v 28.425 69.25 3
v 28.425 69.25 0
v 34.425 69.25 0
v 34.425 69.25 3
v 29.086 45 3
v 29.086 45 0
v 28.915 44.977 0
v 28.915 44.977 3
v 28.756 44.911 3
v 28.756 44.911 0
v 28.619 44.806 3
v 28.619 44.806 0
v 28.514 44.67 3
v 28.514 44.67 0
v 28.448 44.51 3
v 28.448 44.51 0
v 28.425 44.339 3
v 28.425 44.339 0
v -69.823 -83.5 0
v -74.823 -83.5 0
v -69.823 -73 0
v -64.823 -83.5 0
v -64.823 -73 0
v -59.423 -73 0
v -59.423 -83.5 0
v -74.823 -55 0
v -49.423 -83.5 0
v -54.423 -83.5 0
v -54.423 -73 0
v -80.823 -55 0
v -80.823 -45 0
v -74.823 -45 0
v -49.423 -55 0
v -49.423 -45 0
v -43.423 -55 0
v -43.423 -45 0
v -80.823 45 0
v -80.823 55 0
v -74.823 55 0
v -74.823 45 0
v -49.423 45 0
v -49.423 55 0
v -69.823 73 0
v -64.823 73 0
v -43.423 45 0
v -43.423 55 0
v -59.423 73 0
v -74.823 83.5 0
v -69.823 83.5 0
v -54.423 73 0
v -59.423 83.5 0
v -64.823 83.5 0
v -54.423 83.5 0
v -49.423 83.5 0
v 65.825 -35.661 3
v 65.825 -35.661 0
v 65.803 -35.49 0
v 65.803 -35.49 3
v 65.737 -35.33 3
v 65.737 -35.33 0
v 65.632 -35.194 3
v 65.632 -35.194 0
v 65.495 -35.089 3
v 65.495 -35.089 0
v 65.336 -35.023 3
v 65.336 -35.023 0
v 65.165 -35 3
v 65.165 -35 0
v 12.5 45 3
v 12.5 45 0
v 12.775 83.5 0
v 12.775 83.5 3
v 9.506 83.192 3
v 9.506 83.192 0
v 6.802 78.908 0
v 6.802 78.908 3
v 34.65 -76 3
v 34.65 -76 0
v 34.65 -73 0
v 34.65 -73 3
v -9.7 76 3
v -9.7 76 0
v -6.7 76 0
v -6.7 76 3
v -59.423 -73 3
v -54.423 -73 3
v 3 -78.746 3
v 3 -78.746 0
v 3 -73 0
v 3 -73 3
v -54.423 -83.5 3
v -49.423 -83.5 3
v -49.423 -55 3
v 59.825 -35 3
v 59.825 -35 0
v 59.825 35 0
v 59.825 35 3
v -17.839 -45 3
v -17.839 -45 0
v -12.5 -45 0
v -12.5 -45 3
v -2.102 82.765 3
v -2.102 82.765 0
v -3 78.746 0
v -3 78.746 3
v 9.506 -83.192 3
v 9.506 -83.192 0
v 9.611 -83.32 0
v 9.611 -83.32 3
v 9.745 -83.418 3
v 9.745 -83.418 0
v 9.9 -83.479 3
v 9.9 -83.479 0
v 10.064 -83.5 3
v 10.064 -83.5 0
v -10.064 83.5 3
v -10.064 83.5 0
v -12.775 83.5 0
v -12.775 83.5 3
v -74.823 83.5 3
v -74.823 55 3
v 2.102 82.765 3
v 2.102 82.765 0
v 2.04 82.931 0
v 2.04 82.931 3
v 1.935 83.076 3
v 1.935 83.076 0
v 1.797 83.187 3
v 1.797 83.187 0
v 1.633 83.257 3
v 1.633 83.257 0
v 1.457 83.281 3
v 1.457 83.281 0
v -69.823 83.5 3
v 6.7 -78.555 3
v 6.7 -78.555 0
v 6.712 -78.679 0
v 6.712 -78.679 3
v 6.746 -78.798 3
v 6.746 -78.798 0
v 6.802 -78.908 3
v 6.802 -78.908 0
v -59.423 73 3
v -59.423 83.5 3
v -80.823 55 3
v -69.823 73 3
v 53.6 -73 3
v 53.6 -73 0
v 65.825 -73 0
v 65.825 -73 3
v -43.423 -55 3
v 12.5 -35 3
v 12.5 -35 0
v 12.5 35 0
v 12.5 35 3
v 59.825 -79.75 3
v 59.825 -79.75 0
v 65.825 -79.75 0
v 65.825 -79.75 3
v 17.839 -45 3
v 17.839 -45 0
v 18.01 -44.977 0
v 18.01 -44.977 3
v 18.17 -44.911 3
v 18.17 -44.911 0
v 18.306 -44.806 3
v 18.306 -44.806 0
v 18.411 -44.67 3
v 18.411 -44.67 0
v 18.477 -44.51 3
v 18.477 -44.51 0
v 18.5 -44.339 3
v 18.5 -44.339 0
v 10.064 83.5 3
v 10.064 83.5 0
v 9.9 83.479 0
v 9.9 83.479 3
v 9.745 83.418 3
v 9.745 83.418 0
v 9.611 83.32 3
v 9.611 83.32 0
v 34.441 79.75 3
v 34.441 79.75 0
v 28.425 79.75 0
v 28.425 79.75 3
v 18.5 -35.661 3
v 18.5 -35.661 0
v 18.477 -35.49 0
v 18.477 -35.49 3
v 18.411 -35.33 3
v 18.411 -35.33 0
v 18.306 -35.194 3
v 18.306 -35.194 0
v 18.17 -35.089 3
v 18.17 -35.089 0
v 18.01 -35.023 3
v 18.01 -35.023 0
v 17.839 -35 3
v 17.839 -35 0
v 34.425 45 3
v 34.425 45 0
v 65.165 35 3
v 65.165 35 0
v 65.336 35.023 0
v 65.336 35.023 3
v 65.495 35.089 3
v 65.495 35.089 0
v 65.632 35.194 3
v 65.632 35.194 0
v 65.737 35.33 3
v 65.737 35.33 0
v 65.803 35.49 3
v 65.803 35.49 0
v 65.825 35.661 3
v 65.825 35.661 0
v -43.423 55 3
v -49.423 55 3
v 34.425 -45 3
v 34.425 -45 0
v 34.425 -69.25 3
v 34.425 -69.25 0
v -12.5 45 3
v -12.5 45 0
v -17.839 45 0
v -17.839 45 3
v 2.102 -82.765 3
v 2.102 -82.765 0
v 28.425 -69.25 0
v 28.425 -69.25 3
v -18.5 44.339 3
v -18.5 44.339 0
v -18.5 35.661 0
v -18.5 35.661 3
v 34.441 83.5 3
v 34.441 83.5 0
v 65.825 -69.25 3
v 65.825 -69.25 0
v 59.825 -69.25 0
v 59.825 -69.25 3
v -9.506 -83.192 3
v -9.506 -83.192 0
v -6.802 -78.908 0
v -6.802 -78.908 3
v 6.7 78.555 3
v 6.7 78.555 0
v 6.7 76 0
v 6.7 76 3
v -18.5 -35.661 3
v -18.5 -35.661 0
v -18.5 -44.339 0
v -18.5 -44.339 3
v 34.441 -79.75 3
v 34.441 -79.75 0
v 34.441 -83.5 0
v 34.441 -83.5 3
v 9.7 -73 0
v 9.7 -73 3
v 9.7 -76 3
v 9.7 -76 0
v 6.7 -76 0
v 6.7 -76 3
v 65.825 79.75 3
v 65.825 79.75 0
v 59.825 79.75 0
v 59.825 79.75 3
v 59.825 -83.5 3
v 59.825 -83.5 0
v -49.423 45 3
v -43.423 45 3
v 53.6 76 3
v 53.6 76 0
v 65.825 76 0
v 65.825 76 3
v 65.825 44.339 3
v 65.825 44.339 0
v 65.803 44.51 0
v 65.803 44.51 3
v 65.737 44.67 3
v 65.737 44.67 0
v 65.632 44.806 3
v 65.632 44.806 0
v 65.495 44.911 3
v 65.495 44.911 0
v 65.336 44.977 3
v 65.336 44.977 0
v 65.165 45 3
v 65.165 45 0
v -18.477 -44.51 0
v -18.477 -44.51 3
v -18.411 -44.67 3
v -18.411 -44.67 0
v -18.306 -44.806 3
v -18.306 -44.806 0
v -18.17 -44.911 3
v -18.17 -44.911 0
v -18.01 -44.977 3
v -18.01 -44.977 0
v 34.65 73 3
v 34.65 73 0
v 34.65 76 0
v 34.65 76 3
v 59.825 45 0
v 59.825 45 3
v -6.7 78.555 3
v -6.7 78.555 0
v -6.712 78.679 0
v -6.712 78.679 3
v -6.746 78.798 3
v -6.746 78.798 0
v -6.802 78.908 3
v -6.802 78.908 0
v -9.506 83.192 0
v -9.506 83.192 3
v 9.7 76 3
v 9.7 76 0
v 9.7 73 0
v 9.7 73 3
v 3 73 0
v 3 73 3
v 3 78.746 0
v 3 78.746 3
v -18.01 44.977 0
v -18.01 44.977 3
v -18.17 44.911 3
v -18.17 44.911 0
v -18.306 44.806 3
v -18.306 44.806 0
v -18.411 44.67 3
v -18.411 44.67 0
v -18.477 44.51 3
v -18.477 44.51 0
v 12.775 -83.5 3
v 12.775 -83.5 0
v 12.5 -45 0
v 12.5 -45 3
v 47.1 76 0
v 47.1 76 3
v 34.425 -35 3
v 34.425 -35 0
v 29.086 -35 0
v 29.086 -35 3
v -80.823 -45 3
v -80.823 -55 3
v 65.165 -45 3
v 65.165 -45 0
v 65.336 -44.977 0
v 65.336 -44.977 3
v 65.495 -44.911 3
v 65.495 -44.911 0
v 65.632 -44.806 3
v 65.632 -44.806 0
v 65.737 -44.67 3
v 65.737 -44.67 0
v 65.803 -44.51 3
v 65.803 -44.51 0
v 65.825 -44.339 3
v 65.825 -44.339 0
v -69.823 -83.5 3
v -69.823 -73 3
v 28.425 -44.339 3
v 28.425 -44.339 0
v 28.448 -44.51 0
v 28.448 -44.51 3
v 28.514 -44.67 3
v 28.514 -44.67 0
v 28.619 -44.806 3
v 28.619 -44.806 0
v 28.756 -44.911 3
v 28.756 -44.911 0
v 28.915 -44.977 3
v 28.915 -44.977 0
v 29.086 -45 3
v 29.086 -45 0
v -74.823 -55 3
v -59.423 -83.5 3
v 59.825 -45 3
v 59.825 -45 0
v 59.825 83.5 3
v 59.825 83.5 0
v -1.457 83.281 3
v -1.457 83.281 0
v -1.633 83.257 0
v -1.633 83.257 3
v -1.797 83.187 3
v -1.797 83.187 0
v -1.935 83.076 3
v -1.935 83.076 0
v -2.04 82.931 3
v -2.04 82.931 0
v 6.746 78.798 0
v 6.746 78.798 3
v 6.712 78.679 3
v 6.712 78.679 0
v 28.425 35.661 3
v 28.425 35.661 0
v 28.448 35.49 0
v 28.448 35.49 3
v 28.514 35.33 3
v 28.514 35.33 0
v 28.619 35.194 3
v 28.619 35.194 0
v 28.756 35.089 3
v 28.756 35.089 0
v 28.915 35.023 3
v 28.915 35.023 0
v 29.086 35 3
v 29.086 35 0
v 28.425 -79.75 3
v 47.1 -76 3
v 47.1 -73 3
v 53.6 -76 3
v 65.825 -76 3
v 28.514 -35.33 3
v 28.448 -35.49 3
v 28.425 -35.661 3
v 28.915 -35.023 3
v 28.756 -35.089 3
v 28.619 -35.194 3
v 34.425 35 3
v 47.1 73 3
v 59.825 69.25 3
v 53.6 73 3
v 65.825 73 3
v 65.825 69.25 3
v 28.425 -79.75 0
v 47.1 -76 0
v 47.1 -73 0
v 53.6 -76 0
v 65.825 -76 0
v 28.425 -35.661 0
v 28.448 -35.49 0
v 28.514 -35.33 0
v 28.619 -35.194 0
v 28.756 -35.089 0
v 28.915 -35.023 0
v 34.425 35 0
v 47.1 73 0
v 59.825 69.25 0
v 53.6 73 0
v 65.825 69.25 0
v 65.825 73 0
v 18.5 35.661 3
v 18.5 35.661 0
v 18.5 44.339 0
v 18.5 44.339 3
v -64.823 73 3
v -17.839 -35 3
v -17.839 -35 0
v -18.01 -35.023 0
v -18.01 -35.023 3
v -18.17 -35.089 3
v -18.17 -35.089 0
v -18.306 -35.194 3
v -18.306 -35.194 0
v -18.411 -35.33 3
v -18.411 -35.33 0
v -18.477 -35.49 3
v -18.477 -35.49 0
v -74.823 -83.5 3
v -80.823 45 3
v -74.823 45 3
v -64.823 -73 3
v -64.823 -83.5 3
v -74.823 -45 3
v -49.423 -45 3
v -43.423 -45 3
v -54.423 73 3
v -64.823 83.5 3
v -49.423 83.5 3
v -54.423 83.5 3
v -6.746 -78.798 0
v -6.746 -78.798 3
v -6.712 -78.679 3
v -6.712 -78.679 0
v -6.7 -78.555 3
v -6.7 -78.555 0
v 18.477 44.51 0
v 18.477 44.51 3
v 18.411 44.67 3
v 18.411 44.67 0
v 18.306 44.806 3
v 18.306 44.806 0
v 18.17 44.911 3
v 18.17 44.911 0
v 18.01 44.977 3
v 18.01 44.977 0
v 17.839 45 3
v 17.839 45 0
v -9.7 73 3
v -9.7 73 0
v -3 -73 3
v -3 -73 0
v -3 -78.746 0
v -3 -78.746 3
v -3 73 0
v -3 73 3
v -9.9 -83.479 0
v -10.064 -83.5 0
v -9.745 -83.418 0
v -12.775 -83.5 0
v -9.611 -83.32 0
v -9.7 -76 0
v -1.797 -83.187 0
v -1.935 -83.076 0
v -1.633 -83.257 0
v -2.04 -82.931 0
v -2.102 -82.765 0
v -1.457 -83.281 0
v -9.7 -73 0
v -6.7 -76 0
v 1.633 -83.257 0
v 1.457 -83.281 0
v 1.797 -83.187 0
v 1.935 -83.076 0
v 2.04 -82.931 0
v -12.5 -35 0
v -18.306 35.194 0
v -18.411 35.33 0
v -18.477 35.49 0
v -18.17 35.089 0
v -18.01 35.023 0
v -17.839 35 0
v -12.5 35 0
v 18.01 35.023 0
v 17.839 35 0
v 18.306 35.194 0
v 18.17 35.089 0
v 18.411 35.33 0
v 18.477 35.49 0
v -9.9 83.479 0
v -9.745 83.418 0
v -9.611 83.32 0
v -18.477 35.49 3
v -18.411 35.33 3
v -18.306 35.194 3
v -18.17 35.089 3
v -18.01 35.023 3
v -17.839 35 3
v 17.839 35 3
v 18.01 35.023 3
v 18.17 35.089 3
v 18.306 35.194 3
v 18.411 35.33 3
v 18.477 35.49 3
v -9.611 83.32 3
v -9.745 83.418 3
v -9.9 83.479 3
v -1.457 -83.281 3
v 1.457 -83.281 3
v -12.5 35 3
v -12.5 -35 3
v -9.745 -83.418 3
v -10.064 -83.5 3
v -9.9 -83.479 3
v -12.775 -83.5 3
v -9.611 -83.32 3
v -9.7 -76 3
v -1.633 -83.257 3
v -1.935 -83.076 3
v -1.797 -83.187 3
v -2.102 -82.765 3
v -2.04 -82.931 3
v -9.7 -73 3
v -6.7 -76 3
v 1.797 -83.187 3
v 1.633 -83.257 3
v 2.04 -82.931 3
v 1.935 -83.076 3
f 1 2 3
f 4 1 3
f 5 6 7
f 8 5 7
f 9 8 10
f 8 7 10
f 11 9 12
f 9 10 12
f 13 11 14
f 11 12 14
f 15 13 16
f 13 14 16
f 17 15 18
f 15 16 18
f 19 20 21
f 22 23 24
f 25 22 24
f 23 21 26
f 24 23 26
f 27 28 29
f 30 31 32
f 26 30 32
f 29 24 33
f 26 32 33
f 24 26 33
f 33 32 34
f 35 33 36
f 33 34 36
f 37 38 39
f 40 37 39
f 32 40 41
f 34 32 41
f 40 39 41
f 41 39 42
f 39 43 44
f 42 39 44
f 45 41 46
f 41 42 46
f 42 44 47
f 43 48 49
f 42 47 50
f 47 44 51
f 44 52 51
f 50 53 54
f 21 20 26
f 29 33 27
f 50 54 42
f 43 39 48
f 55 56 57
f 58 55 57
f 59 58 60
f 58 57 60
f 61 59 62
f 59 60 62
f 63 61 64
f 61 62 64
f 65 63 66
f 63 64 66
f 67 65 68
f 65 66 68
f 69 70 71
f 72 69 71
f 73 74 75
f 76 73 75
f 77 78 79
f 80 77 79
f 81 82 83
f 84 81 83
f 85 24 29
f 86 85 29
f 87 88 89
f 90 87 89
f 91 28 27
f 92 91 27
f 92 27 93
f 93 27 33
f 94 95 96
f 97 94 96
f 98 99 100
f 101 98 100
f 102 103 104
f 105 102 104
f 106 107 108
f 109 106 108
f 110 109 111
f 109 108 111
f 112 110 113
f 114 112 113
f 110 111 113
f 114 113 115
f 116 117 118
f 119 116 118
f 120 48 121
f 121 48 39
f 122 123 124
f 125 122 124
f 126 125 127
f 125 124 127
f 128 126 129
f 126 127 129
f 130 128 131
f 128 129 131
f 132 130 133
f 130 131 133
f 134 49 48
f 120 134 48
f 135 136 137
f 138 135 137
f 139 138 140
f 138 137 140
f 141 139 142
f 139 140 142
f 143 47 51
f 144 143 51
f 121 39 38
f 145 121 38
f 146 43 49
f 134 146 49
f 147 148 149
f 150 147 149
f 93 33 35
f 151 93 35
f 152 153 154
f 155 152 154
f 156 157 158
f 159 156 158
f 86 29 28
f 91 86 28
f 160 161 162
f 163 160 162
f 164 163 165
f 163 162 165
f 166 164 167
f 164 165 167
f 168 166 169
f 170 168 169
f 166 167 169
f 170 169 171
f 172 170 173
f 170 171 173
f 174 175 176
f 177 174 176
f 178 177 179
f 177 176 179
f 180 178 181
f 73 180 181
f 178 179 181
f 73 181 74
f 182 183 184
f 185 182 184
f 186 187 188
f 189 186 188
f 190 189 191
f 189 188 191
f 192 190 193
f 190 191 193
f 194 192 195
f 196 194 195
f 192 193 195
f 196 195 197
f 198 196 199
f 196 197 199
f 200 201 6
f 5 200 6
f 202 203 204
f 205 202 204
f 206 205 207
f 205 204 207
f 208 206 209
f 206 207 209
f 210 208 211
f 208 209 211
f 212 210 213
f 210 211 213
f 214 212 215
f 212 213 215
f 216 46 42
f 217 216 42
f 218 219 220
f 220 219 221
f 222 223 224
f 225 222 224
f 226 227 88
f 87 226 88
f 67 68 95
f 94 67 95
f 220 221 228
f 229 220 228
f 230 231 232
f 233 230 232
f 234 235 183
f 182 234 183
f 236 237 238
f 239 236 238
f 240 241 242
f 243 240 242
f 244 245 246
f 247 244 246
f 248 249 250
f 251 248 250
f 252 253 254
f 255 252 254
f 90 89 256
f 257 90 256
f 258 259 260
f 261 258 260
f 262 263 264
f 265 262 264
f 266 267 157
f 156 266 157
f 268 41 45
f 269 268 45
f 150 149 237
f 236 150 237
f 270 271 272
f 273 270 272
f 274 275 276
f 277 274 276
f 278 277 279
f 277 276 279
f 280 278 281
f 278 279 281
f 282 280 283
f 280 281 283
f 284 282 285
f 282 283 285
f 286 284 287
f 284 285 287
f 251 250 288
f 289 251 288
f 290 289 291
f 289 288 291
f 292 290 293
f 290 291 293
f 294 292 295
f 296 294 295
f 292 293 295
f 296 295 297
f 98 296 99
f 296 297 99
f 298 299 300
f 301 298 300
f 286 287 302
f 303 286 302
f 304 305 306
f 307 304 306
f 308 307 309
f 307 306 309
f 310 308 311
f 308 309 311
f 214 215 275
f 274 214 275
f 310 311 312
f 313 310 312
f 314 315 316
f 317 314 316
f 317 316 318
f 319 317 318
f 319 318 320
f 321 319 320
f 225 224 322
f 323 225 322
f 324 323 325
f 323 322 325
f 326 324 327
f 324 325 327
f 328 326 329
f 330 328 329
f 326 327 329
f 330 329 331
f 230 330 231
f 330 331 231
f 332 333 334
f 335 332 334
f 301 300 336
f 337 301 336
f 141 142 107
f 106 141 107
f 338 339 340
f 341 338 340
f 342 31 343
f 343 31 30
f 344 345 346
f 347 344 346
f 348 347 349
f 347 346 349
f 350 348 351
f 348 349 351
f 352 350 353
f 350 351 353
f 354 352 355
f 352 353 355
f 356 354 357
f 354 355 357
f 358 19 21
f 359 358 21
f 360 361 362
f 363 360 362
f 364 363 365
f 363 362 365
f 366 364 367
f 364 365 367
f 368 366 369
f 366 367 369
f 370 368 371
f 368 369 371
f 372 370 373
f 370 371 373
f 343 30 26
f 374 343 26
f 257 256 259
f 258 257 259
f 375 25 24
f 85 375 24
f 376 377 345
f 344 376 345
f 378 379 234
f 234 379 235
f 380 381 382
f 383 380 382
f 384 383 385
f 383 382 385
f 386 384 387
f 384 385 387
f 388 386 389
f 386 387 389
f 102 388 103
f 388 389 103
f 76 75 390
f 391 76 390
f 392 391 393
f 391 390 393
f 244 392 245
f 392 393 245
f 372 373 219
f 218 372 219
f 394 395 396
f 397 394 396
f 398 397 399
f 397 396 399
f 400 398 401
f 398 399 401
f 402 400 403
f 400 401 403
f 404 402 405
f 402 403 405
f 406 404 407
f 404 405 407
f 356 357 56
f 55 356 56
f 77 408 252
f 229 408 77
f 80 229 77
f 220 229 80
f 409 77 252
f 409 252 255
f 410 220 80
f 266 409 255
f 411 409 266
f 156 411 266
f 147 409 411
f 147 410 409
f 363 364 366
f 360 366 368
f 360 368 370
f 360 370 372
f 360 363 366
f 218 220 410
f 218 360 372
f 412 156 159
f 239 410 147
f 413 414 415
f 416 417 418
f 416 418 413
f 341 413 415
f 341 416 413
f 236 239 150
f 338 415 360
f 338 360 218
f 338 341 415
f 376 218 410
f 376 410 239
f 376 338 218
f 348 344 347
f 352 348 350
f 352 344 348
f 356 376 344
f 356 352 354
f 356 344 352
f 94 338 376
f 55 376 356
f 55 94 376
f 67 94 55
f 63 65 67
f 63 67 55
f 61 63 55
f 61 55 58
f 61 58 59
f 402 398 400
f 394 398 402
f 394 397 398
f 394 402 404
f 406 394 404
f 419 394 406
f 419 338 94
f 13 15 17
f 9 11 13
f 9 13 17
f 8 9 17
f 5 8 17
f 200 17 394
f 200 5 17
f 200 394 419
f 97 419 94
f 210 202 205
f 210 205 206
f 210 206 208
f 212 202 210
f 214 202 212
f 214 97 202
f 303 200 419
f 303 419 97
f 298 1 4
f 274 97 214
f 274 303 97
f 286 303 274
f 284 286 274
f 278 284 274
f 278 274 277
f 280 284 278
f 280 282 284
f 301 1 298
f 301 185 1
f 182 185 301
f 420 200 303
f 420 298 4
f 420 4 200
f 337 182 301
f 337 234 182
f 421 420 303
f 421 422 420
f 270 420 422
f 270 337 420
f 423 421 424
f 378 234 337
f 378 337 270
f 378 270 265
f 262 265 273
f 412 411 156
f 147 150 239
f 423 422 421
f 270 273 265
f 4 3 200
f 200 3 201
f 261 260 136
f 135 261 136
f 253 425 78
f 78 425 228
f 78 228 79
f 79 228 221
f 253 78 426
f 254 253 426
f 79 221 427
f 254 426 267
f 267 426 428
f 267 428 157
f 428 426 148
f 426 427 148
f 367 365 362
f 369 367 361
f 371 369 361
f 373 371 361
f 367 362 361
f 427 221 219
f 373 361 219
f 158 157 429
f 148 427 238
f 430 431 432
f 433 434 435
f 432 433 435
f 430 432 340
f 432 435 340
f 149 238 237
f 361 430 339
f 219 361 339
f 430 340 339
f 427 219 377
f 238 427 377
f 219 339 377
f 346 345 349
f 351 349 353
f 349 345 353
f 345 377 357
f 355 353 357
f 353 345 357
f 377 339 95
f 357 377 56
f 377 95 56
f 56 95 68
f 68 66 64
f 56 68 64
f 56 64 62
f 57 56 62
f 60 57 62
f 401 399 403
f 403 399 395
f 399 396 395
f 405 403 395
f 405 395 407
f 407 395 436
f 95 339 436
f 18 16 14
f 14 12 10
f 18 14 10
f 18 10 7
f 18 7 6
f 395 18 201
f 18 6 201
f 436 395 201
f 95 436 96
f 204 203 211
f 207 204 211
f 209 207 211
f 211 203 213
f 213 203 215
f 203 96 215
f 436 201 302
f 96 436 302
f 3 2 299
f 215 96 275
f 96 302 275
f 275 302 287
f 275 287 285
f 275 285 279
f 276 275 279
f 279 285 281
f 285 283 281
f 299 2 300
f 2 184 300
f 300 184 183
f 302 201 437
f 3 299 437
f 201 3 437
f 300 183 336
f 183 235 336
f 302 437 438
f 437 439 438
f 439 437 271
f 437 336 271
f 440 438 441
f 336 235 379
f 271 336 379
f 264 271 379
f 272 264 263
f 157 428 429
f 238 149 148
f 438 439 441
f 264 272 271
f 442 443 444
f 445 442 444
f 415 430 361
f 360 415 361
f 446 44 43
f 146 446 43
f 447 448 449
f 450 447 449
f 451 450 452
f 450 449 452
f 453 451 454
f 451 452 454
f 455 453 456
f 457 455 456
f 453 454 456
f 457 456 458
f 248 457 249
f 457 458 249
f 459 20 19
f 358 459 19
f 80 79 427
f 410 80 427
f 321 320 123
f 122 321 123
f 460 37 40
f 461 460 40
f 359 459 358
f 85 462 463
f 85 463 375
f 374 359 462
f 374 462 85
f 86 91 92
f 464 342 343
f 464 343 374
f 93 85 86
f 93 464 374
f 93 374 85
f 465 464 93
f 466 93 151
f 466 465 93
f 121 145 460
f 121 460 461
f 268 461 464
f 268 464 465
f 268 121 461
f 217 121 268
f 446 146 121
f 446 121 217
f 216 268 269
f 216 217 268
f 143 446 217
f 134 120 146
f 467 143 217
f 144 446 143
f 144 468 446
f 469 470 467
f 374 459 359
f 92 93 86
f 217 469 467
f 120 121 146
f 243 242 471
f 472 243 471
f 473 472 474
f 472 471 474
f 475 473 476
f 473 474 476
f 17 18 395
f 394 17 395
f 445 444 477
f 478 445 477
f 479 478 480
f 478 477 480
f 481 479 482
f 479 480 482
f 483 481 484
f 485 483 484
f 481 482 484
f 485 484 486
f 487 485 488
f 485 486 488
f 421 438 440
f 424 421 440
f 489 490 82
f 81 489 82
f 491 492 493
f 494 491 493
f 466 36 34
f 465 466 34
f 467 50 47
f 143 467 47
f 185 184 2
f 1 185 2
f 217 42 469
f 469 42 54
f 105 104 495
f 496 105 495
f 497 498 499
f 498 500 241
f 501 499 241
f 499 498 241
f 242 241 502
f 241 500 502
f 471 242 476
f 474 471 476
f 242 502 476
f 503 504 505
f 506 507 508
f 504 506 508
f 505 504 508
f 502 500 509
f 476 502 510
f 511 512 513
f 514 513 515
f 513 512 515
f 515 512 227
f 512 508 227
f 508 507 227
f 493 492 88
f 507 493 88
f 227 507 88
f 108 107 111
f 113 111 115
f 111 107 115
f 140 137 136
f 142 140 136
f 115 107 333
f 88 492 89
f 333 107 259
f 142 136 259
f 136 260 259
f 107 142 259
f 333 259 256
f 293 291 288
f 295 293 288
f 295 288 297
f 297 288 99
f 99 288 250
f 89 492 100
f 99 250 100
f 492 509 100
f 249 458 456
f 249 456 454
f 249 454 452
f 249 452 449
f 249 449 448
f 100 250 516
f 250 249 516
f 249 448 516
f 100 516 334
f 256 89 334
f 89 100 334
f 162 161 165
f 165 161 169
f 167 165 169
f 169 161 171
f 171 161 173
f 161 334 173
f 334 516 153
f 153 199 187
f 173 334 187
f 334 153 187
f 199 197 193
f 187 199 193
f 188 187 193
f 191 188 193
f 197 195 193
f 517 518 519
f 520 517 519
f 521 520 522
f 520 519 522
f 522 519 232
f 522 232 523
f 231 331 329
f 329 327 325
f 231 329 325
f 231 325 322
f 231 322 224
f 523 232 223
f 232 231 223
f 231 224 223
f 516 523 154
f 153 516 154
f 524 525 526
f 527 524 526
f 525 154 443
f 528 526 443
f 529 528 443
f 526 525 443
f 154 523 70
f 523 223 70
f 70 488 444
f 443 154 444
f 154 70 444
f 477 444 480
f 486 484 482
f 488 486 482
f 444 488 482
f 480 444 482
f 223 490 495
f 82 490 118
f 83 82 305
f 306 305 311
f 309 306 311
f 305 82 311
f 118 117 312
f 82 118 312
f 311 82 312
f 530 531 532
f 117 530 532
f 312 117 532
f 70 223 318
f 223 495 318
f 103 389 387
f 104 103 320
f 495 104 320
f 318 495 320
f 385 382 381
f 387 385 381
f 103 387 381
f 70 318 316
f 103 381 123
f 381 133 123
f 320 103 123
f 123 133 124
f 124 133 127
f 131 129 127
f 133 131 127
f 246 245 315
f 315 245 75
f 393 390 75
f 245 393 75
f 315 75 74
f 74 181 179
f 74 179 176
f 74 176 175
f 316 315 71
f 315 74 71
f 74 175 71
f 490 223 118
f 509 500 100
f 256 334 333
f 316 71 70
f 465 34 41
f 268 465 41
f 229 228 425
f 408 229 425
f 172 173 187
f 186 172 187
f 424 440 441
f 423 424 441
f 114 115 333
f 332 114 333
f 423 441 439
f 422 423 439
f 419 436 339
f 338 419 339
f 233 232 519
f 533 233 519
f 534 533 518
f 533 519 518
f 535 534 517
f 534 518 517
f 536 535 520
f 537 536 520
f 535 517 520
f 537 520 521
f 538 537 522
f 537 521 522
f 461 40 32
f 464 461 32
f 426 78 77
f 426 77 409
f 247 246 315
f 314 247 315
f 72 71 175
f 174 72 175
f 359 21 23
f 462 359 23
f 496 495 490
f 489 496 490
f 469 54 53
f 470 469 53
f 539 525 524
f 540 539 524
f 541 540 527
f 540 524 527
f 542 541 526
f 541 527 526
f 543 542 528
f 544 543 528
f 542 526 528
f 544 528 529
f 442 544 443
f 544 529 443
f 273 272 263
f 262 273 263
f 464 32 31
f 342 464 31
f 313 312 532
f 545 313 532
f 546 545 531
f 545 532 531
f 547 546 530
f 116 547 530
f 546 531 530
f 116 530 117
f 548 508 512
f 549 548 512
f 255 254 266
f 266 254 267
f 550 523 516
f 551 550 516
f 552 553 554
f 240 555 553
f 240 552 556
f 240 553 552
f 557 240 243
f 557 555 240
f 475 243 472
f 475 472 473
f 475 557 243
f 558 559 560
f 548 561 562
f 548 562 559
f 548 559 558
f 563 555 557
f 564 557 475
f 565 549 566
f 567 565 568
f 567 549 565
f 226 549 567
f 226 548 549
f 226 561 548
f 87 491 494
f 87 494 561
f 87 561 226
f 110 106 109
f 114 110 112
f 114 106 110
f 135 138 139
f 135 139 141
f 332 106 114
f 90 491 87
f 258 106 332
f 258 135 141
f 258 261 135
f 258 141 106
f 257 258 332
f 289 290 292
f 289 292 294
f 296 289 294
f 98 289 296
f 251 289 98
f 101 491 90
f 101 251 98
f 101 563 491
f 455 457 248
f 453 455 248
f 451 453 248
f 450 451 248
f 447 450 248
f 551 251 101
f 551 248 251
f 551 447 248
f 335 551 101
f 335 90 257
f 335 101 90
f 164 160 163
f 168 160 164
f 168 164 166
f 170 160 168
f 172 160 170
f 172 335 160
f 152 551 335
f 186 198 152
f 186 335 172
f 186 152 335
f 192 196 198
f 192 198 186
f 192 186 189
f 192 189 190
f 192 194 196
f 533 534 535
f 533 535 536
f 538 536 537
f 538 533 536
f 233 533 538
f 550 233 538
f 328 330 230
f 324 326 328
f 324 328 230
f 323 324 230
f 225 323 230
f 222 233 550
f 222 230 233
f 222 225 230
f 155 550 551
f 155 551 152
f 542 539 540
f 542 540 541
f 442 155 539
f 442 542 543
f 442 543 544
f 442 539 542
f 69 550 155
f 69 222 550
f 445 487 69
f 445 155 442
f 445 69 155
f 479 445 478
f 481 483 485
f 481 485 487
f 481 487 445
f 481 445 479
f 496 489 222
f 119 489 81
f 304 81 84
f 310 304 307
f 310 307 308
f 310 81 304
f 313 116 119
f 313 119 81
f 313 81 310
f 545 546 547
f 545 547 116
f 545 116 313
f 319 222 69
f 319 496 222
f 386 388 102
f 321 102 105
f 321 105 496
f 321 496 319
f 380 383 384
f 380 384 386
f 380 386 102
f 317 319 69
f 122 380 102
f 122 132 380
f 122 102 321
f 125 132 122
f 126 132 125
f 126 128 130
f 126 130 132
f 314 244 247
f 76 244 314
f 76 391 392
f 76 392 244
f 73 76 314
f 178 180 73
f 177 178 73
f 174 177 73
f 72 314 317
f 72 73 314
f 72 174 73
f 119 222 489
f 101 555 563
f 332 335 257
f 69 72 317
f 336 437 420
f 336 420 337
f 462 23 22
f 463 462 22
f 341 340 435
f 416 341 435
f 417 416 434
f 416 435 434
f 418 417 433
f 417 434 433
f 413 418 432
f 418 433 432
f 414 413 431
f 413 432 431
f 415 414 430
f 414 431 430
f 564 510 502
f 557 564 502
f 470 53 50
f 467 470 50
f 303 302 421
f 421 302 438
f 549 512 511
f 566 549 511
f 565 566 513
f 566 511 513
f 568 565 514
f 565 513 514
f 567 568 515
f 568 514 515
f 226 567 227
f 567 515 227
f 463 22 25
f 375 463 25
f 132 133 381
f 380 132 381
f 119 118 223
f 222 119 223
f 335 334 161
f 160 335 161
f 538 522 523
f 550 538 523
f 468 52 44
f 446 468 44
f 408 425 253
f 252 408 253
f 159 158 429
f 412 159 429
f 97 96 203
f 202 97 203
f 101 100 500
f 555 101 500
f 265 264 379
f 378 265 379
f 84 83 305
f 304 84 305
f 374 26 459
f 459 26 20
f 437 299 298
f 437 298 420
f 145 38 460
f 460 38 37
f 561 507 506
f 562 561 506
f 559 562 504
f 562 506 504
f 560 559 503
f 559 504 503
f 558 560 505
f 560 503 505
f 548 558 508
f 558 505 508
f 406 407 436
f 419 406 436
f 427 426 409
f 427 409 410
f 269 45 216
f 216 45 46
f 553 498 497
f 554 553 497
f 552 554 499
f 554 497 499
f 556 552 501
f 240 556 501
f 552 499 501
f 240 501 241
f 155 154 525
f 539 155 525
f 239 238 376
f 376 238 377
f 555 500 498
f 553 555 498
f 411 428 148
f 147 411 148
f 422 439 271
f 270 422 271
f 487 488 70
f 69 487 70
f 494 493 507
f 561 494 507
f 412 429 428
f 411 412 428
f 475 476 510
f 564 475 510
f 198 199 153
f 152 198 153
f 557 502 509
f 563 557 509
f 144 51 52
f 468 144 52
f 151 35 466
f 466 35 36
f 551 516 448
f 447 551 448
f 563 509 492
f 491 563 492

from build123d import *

# Parameters (mm, degrees)
F1_DEPTH = 3
F2_W     = 12.45
F2_H     = 3
F3_DEPTH = 3
F5_DEPTH = 3


with BuildPart() as f1:
    # F0 (on Top) → F1 (new body)
    with BuildSketch(Plane.XY):
        with BuildLine():
            Line((-9.7, 73), (-9.7, 76))
            Line((-9.7, 76), (-6.7, 76))
            Line((-6.7, 76), (-6.7, 78.555361))
            ThreePointArc((-6.7, 78.555361), (-6.726009, 78.738935), (-6.801989, 78.908059))
            Line((-6.801989, 78.908059), (-9.505527, 83.191854))
            ThreePointArc((-9.505527, 83.191854), (-9.745292, 83.417858), (-10.064382, 83.5))
            Line((-10.064382, 83.5), (-12.775105, 83.5))
            Line((-12.775105, 83.5), (-12.5, 45))
            Line((-12.5, 45), (-17.839156, 45))
            ThreePointArc((-17.839156, 45), (-18.306443, 44.806443), (-18.5, 44.339156))
            Line((-18.5, 44.339156), (-18.5, 35.660844))
            ThreePointArc((-18.5, 35.660844), (-18.306443, 35.193557), (-17.839156, 35))
            Line((-17.839156, 35), (-12.5, 35))
            Line((-12.5, 35), (-12.5, 0))
            Line((-12.5, 0), (-12.5, -35))
            Line((-12.5, -35), (-17.839156, -35))
            ThreePointArc((-17.839156, -35), (-18.306443, -35.193557), (-18.5, -35.660844))
            Line((-18.5, -35.660844), (-18.5, -44.339156))
            ThreePointArc((-18.5, -44.339156), (-18.306443, -44.806443), (-17.839156, -45))
            Line((-17.839156, -45), (-12.5, -45))
            Line((-12.5, -45), (-12.775105, -83.5))
            Line((-12.775105, -83.5), (-10.064382, -83.5))
            ThreePointArc((-10.064382, -83.5), (-9.745292, -83.417858), (-9.505527, -83.191854))
            Line((-9.505527, -83.191854), (-6.801989, -78.908059))
            ThreePointArc((-6.801989, -78.908059), (-6.726009, -78.738935), (-6.7, -78.555361))
            Line((-6.7, -78.555361), (-6.7, -76))
            Line((-6.7, -76), (-9.7, -76))
            Line((-9.7, -76), (-9.7, -73))
            Line((-9.7, -73), (-3, -73))
            Line((-3, -73), (-3, -78.746456))
            Line((-3, -78.746456), (-2.101524, -82.764542))
            ThreePointArc((-2.101524, -82.764542), (-1.869774, -83.136093), (-1.456606, -83.281178))
            Line((-1.456606, -83.281178), (0, -83.281178))
            Line((0, -83.281178), (1.456606, -83.281178))
            ThreePointArc((1.456606, -83.281178), (1.869774, -83.136093), (2.101524, -82.764542))
            Line((2.101524, -82.764542), (3, -78.746456))
            Line((3, -78.746456), (3, -73))
            Line((3, -73), (9.7, -73))
            Line((9.7, -73), (9.7, -76))
            Line((9.7, -76), (6.7, -76))
            Line((6.7, -76), (6.7, -78.555361))
            ThreePointArc((6.7, -78.555361), (6.726009, -78.738935), (6.801989, -78.908059))
            Line((6.801989, -78.908059), (9.505527, -83.191854))
            ThreePointArc((9.505527, -83.191854), (9.745292, -83.417858), (10.064382, -83.5))
            Line((10.064382, -83.5), (12.775105, -83.5))
            Line((12.775105, -83.5), (12.5, -45))
            Line((12.5, -45), (17.839156, -45))
            ThreePointArc((17.839156, -45), (18.306443, -44.806443), (18.5, -44.339156))
            Line((18.5, -44.339156), (18.5, -35.660844))
            ThreePointArc((18.5, -35.660844), (18.306443, -35.193557), (17.839156, -35))
            Line((17.839156, -35), (12.5, -35))
            Line((12.5, -35), (12.5, 0))
            Line((12.5, 0), (12.5, 35))
            Line((12.5, 35), (17.839156, 35))
            ThreePointArc((17.839156, 35), (18.306443, 35.193557), (18.5, 35.660844))
            Line((18.5, 35.660844), (18.5, 44.339156))
            ThreePointArc((18.5, 44.339156), (18.306443, 44.806443), (17.839156, 45))
            Line((17.839156, 45), (12.5, 45))
            Line((12.5, 45), (12.775105, 83.5))
            Line((12.775105, 83.5), (10.064382, 83.5))
            ThreePointArc((10.064382, 83.5), (9.745292, 83.417858), (9.505527, 83.191854))
            Line((9.505527, 83.191854), (6.801989, 78.908059))
            ThreePointArc((6.801989, 78.908059), (6.726009, 78.738935), (6.7, 78.555361))
            Line((6.7, 78.555361), (6.7, 76))
            Line((6.7, 76), (9.7, 76))
            Line((9.7, 76), (9.7, 73))
            Line((9.7, 73), (3, 73))
            Line((3, 73), (3, 78.746456))
            Line((3, 78.746456), (2.101524, 82.764542))
            ThreePointArc((2.101524, 82.764542), (1.869774, 83.136093), (1.456606, 83.281178))
            Line((1.456606, 83.281178), (0, 83.281178))
            Line((0, 83.281178), (-1.456606, 83.281178))
            ThreePointArc((-1.456606, 83.281178), (-1.869774, 83.136093), (-2.101524, 82.764542))
            Line((-2.101524, 82.764542), (-3, 78.746456))
            Line((-3, 78.746456), (-3, 73))
            Line((-3, 73), (-9.7, 73))
        make_face()
    extrude(amount=F1_DEPTH)


with BuildPart() as f3:
    # F2 (on Top) → F3 (new body)
    with BuildSketch(Plane.XY):
        with BuildLine():
            Line((34.425482, 45), (29.086326, 45))
            ThreePointArc((29.086326, 45), (28.619039, 44.806443), (28.425482, 44.339156))
            Line((28.425482, 44.339156), (28.425482, 35.660844))
            ThreePointArc((28.425482, 35.660844), (28.619039, 35.193557), (29.086326, 35))
            Line((29.086326, 35), (34.425482, 35))
            Line((34.425482, 35), (34.425482, 0))
            Line((34.425482, 0), (34.425482, -35))
            Line((34.425482, -35), (29.086326, -35))
            ThreePointArc((29.086326, -35), (28.619039, -35.193557), (28.425482, -35.660844))
            Line((28.425482, -35.660844), (28.425482, -44.339156))
            ThreePointArc((28.425482, -44.339156), (28.619039, -44.806443), (29.086326, -45))
            Line((29.086326, -45), (34.425482, -45))
            Line((34.425482, -45), (34.425482, -69.25))
            Line((34.425482, -69.25), (28.425482, -69.25))
            Line((28.425482, -69.25), (28.425482, -79.75))
            Line((28.425482, -79.75), (34.440659, -79.75))
            Line((34.440659, -79.75), (34.440659, -83.5))
            Line((34.440659, -83.5), (59.825482, -83.5))
            Line((59.825482, -83.5), (59.825482, -79.75))
            Line((59.825482, -79.75), (65.825482, -79.75))
            Line((65.825482, -79.75), (65.825482, -76))
            Line((65.825482, -76), (53.600482, -76))
            Line((53.600482, -76), (53.600482, -73))
            Line((53.600482, -73), (65.825482, -73))
            Line((65.825482, -73), (65.825482, -69.25))
            Line((65.825482, -69.25), (59.825482, -69.25))
            Line((59.825482, -69.25), (59.825482, -45))
            Line((59.825482, -45), (65.164638, -45))
            ThreePointArc((65.164638, -45), (65.631925, -44.806443), (65.825482, -44.339156))
            Line((65.825482, -44.339156), (65.825482, -35.660844))
            ThreePointArc((65.825482, -35.660844), (65.631925, -35.193557), (65.164638, -35))
            Line((65.164638, -35), (59.825482, -35))
            Line((59.825482, -35), (59.825482, 0))
            Line((59.825482, 0), (59.825482, 35))
            Line((59.825482, 35), (65.164638, 35))
            ThreePointArc((65.164638, 35), (65.631925, 35.193557), (65.825482, 35.660844))
            Line((65.825482, 35.660844), (65.825482, 44.339156))
            ThreePointArc((65.825482, 44.339156), (65.631925, 44.806443), (65.164638, 45))
            Line((65.164638, 45), (59.825482, 45))
            Line((59.825482, 45), (59.825482, 69.25))
            Line((59.825482, 69.25), (65.825482, 69.25))
            Line((65.825482, 69.25), (65.825482, 73))
            Line((65.825482, 73), (53.600482, 73))
            Line((53.600482, 73), (53.600482, 76))
            Line((53.600482, 76), (65.825482, 76))
            Line((65.825482, 76), (65.825482, 79.75))
            Line((65.825482, 79.75), (59.825482, 79.75))
            Line((59.825482, 79.75), (59.825482, 83.5))
            Line((59.825482, 83.5), (34.440659, 83.5))
            Line((34.440659, 83.5), (34.440659, 79.75))
            Line((34.440659, 79.75), (28.425482, 79.75))
            Line((28.425482, 79.75), (28.425482, 69.25))
            Line((28.425482, 69.25), (34.425482, 69.25))
            Line((34.425482, 69.25), (34.425482, 45))
        make_face()
        with Locations((40.875482, -74.5)):
            Rectangle(F2_W, F2_H, mode=Mode.SUBTRACT)
        with Locations((40.875482, 74.5)):
            Rectangle(F2_W, F2_H, mode=Mode.SUBTRACT)
    extrude(amount=F3_DEPTH)


with BuildPart() as f5:
    # F4 (on Top) → F5 (new body)
    with BuildSketch(Plane.XY):
        Polygon((-74.822811, 45), (-74.822811, 0), (-74.822811, -45), (-80.822811, -45), (-80.822811, -55), (-74.822811, -55), (-74.822811, -83.5), (-69.822811, -83.5), (-69.822811, -73), (-64.822811, -73), (-64.822811, -83.5), (-59.422811, -83.5), (-59.422811, -73), (-54.422811, -73), (-54.422811, -83.5), (-49.422811, -83.5), (-49.422811, -55), (-43.422811, -55), (-43.422811, -45), (-49.422811, -45), (-49.422811, 0), (-49.422811, 45), (-43.422811, 45), (-43.422811, 55), (-49.422811, 55), (-49.422811, 83.5), (-54.422811, 83.5), (-54.422811, 73), (-59.422811, 73), (-59.422811, 83.5), (-64.822811, 83.5), (-64.822811, 73), (-69.822811, 73), (-69.822811, 83.5), (-74.822811, 83.5), (-74.822811, 55), (-80.822811, 55), (-80.822811, 45), align=None)
    extrude(amount=F5_DEPTH)


solid = Compound([f1.part, f3.part, f5.part])
